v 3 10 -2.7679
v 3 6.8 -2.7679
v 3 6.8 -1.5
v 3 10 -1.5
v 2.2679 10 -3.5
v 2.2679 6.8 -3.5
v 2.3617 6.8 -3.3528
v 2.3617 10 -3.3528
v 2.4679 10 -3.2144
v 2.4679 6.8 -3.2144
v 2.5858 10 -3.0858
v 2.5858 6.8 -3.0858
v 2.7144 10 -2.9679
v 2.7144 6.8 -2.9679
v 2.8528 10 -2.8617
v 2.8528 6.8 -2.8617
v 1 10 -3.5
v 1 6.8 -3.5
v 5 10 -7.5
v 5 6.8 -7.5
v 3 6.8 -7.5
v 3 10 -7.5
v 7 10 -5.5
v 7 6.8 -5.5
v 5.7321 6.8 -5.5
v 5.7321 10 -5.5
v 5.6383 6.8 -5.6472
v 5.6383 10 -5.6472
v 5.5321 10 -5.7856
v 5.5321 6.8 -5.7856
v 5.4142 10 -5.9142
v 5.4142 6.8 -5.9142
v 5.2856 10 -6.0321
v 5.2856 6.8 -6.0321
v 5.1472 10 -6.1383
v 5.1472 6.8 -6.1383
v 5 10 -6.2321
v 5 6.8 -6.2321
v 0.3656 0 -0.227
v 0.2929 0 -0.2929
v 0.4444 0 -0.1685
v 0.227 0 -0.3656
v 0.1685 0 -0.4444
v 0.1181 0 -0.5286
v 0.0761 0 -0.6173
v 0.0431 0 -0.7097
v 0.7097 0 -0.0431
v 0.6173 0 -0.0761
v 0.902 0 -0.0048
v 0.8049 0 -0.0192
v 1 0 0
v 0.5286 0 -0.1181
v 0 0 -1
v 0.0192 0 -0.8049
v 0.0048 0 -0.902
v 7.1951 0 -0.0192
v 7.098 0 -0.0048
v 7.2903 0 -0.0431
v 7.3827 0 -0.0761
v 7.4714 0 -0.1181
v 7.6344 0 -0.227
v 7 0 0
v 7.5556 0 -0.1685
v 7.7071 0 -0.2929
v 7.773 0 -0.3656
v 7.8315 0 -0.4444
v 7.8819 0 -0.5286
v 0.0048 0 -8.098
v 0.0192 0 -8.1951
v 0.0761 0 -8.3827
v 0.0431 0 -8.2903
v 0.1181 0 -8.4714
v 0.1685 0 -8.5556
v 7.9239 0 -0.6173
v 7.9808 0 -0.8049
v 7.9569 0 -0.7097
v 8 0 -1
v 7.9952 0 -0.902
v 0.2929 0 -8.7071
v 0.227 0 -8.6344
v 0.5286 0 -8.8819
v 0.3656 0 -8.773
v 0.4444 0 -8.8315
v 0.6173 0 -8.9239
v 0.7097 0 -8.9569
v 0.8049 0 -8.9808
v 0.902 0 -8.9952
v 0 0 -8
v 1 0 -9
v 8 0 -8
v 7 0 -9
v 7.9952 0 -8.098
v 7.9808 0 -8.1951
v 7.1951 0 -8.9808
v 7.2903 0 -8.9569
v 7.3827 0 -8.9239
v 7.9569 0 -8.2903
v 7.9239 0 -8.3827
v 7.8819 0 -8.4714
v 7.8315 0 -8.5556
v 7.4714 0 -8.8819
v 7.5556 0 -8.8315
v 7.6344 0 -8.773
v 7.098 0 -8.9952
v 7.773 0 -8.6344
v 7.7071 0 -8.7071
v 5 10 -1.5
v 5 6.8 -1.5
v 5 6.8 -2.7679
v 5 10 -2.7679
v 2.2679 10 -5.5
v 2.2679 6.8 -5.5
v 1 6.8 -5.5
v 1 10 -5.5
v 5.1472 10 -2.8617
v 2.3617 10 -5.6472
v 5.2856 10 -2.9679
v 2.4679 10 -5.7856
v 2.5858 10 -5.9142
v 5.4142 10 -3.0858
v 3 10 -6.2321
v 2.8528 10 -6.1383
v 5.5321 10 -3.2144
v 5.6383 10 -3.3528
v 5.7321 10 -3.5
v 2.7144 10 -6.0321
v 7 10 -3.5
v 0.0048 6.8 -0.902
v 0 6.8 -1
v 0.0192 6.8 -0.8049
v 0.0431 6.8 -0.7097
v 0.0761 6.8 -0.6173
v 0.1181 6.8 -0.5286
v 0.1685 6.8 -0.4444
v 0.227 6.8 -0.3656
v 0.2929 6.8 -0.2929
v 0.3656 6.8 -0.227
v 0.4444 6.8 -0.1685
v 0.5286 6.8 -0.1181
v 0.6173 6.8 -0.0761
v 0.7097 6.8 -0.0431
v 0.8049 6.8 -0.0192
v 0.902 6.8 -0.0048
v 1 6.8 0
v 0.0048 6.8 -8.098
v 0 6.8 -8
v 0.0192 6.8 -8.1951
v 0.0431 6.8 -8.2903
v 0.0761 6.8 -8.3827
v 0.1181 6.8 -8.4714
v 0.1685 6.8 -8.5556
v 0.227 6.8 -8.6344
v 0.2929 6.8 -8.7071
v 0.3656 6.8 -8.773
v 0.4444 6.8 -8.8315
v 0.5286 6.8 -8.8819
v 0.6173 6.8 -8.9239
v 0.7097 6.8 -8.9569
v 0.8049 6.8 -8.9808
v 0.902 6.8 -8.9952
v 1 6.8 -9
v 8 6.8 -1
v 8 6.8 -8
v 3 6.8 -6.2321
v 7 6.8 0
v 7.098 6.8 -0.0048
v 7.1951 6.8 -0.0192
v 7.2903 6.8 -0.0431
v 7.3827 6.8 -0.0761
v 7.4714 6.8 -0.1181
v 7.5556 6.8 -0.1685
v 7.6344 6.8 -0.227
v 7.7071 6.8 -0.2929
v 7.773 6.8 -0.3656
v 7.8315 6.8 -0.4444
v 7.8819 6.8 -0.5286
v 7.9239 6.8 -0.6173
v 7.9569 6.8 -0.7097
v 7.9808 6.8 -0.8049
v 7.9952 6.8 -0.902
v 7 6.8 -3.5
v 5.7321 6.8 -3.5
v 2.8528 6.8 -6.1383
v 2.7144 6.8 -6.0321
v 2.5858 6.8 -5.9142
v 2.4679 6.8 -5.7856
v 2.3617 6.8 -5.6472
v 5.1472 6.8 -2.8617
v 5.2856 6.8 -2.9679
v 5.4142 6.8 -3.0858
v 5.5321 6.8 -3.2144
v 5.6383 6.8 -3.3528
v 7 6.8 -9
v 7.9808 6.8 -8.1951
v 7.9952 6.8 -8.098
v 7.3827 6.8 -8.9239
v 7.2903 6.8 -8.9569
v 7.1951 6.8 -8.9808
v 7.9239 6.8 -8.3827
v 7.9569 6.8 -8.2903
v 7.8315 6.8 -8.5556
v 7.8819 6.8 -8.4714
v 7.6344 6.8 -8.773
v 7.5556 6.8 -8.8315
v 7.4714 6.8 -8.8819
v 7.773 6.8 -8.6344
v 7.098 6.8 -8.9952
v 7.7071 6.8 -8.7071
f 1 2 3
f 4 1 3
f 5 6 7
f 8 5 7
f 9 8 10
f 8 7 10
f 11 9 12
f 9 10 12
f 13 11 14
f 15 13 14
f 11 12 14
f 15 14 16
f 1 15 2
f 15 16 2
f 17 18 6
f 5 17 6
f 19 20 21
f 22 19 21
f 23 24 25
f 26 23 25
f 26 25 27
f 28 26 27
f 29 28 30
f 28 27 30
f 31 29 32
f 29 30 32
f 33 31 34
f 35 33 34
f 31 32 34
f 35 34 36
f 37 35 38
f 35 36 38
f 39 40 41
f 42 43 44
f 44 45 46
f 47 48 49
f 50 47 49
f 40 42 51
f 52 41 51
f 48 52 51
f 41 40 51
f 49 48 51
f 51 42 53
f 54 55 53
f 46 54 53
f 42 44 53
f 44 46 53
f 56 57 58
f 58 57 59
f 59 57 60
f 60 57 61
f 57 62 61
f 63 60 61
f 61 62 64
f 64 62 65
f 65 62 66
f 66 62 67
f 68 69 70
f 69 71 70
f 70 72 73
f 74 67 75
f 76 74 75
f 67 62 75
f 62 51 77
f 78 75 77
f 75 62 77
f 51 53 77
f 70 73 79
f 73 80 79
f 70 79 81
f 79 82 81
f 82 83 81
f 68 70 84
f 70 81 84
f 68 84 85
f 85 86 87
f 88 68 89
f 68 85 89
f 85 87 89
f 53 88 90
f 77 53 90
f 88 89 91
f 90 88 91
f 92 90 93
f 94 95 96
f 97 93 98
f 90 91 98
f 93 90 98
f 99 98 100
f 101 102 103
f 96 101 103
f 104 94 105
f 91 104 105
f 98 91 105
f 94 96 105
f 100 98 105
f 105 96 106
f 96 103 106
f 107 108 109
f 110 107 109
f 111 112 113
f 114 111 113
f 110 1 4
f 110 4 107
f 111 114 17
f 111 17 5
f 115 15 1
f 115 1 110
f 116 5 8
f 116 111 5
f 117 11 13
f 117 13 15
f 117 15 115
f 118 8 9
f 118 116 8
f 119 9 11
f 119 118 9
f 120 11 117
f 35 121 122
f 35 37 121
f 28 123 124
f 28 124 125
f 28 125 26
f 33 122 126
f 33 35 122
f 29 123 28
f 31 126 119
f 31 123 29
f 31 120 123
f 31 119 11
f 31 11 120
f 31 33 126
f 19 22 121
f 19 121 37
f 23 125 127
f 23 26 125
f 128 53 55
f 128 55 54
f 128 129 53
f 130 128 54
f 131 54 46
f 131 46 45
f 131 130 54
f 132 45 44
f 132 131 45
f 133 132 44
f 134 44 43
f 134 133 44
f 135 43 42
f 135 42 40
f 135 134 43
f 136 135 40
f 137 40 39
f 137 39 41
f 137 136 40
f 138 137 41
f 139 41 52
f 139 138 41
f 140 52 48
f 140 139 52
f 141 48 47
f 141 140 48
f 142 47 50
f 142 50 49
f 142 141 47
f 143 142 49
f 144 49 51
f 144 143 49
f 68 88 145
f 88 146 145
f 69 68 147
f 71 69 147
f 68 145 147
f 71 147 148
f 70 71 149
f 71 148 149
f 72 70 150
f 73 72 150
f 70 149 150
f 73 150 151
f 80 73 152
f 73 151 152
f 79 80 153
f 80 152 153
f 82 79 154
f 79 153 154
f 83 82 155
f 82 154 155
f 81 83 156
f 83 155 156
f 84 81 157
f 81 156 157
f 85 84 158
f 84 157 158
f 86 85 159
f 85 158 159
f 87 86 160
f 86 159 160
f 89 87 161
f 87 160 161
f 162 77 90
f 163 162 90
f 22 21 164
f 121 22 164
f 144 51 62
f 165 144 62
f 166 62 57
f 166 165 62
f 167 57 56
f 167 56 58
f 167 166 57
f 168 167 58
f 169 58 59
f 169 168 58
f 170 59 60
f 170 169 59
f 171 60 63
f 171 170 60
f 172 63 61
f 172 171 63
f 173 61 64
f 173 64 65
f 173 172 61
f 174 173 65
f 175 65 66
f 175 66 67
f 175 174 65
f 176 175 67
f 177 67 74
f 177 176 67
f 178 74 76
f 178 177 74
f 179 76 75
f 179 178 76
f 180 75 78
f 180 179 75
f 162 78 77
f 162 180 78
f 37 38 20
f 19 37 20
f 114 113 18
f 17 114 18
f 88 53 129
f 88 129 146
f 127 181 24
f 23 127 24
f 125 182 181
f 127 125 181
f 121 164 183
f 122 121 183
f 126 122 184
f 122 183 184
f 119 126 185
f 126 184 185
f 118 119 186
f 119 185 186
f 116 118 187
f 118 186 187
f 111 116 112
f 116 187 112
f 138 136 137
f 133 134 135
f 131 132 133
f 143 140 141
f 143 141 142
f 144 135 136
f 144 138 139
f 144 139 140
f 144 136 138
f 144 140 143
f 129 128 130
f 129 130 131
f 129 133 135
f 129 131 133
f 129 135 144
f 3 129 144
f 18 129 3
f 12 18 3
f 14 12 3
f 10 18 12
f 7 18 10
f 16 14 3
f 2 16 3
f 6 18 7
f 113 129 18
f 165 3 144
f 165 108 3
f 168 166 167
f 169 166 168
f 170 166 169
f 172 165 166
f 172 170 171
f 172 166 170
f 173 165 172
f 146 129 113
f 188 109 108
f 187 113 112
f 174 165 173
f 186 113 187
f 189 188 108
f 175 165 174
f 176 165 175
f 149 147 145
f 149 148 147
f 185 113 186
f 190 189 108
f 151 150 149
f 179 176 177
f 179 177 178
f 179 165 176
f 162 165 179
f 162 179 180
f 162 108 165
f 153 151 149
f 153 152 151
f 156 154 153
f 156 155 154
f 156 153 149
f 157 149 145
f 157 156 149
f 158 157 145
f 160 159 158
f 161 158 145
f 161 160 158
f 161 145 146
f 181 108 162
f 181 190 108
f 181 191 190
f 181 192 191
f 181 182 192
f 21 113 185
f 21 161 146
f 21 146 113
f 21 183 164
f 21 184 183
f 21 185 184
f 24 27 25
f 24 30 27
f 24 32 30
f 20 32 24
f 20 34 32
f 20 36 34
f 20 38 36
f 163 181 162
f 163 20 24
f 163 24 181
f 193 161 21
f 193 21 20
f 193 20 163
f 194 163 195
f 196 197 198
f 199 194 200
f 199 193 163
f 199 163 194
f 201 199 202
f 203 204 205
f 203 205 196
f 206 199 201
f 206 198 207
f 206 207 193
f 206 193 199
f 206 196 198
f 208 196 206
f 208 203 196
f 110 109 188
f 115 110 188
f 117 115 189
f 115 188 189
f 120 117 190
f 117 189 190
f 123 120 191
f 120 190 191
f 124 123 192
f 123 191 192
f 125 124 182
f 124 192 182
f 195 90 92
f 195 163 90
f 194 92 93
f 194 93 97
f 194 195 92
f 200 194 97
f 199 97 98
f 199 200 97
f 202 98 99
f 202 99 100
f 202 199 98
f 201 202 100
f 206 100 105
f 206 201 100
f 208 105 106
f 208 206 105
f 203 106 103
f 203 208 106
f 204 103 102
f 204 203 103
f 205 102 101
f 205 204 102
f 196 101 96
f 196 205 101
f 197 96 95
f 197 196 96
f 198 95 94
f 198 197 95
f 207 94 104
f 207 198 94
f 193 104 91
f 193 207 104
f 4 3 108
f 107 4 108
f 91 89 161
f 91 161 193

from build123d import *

# Parameters (mm, degrees)
SKETCH2_W           = 8
SKETCH2_H           = 9
BOSS_EXTRUDE1_DEPTH = 6.8
FILLET1_R           = 1
SKETCH3_W           = 2
SKETCH3_H           = 2
BOSS_EXTRUDE2_DEPTH = 3.2


with BuildPart() as part:
    # Sketch2 → Boss-Extrude1 (new body)
    with BuildSketch(Plane(origin=(0, 0, 0), x_dir=(1, 0, 0), z_dir=(0, 1, 0))):
        with Locations((4, 4.5)):
            Rectangle(SKETCH2_W, SKETCH2_H)
    extrude(amount=BOSS_EXTRUDE1_DEPTH)

    # Fillet1
    fillet1_edges = [part.edges().sort_by_distance(p)[0] for p in [
        (0, 3.4, -9),
        (8, 3.4, -9),
        (8, 3.4, 0),
        (0, 3.4, 0),
    ]]
    fillet(fillet1_edges, radius=FILLET1_R)

    # Sketch3 → Boss-Extrude2 (add)
    with BuildSketch(Plane(origin=(0, 6.8, 0), x_dir=(1, 0, 0), z_dir=(0, 1, 0))):
        with Locations((4, 4.5)):
            Rectangle(SKETCH3_W, SKETCH3_H)
        with BuildLine():
            Line((3, 3.5), (3, 5.5))
            Line((3, 5.5), (2.267949192, 5.5))
            ThreePointArc((2.267949192, 5.5), (2, 4.5), (2.267949192, 3.5))
            Line((2.267949192, 3.5), (3, 3.5))
        make_face()
        with BuildLine():
            Line((3, 5.5), (3, 6.232050808))
            ThreePointArc((3, 6.232050808), (2.585786438, 5.914213562), (2.267949192, 5.5))
            Line((2.267949192, 5.5), (3, 5.5))
        make_face()
        with BuildLine():
            ThreePointArc((5, 6.232050808), (4, 6.5), (3, 6.232050808))
            Line((3, 6.232050808), (3, 5.5))
            Line((3, 5.5), (5, 5.5))
            Line((5, 5.5), (5, 6.232050808))
        make_face()
        with BuildLine():
            Line((5.732050808, 5.5), (5, 5.5))
            Line((5, 5.5), (5, 3.5))
            Line((5, 3.5), (5.732050808, 3.5))
            ThreePointArc((5.732050808, 3.5), (5.931851653, 3.98236191), (6, 4.5))
            ThreePointArc((6, 4.5), (5.931851653, 5.01763809), (5.732050808, 5.5))
        make_face()
        with BuildLine():
            ThreePointArc((5.732050808, 5.5), (5.414213562, 5.914213562), (5, 6.232050808))
            Line((5, 6.232050808), (5, 5.5))
            Line((5, 5.5), (5.732050808, 5.5))
        make_face()
        with BuildLine():
            Line((5, 3.5), (3, 3.5))
            Line((3, 3.5), (3, 2.767949192))
            ThreePointArc((3, 2.767949192), (4, 2.5), (5, 2.767949192))
            Line((5, 2.767949192), (5, 3.5))
        make_face()
        with BuildLine():
            Line((5.732050808, 3.5), (5, 3.5))
            Line((5, 3.5), (5, 2.767949192))
            ThreePointArc((5, 2.767949192), (5.414213562, 3.085786438), (5.732050808, 3.5))
        make_face()
        with BuildLine():
            Line((3, 2.767949192), (3, 3.5))
            Line((3, 3.5), (2.267949192, 3.5))
            ThreePointArc((2.267949192, 3.5), (2.585786438, 3.085786438), (3, 2.767949192))
        make_face()
        with BuildLine():
            ThreePointArc((5, 2.767949192), (4, 2.5), (3, 2.767949192))
            Line((3, 2.767949192), (3, 1.5))
            Line((3, 1.5), (5, 1.5))
            Line((5, 1.5), (5, 2.767949192))
        make_face()
        with BuildLine():
            ThreePointArc((2.267949192, 3.5), (2, 4.5), (2.267949192, 5.5))
            Line((2.267949192, 5.5), (1, 5.5))
            Line((1, 5.5), (1, 3.5))
            Line((1, 3.5), (2.267949192, 3.5))
        make_face()
        with BuildLine():
            Line((5, 7.5), (3, 7.5))
            Line((3, 7.5), (3, 6.232050808))
            ThreePointArc((3, 6.232050808), (4, 6.5), (5, 6.232050808))
            Line((5, 6.232050808), (5, 7.5))
        make_face()
        with BuildLine():
            Line((7, 5.5), (5.732050808, 5.5))
            ThreePointArc((5.732050808, 5.5), (5.931851653, 5.01763809), (6, 4.5))
            ThreePointArc((6, 4.5), (5.931851653, 3.98236191), (5.732050808, 3.5))
            Line((5.732050808, 3.5), (7, 3.5))
            Line((7, 3.5), (7, 5.5))
        make_face()
    extrude(amount=BOSS_EXTRUDE2_DEPTH)


solid = part.part
